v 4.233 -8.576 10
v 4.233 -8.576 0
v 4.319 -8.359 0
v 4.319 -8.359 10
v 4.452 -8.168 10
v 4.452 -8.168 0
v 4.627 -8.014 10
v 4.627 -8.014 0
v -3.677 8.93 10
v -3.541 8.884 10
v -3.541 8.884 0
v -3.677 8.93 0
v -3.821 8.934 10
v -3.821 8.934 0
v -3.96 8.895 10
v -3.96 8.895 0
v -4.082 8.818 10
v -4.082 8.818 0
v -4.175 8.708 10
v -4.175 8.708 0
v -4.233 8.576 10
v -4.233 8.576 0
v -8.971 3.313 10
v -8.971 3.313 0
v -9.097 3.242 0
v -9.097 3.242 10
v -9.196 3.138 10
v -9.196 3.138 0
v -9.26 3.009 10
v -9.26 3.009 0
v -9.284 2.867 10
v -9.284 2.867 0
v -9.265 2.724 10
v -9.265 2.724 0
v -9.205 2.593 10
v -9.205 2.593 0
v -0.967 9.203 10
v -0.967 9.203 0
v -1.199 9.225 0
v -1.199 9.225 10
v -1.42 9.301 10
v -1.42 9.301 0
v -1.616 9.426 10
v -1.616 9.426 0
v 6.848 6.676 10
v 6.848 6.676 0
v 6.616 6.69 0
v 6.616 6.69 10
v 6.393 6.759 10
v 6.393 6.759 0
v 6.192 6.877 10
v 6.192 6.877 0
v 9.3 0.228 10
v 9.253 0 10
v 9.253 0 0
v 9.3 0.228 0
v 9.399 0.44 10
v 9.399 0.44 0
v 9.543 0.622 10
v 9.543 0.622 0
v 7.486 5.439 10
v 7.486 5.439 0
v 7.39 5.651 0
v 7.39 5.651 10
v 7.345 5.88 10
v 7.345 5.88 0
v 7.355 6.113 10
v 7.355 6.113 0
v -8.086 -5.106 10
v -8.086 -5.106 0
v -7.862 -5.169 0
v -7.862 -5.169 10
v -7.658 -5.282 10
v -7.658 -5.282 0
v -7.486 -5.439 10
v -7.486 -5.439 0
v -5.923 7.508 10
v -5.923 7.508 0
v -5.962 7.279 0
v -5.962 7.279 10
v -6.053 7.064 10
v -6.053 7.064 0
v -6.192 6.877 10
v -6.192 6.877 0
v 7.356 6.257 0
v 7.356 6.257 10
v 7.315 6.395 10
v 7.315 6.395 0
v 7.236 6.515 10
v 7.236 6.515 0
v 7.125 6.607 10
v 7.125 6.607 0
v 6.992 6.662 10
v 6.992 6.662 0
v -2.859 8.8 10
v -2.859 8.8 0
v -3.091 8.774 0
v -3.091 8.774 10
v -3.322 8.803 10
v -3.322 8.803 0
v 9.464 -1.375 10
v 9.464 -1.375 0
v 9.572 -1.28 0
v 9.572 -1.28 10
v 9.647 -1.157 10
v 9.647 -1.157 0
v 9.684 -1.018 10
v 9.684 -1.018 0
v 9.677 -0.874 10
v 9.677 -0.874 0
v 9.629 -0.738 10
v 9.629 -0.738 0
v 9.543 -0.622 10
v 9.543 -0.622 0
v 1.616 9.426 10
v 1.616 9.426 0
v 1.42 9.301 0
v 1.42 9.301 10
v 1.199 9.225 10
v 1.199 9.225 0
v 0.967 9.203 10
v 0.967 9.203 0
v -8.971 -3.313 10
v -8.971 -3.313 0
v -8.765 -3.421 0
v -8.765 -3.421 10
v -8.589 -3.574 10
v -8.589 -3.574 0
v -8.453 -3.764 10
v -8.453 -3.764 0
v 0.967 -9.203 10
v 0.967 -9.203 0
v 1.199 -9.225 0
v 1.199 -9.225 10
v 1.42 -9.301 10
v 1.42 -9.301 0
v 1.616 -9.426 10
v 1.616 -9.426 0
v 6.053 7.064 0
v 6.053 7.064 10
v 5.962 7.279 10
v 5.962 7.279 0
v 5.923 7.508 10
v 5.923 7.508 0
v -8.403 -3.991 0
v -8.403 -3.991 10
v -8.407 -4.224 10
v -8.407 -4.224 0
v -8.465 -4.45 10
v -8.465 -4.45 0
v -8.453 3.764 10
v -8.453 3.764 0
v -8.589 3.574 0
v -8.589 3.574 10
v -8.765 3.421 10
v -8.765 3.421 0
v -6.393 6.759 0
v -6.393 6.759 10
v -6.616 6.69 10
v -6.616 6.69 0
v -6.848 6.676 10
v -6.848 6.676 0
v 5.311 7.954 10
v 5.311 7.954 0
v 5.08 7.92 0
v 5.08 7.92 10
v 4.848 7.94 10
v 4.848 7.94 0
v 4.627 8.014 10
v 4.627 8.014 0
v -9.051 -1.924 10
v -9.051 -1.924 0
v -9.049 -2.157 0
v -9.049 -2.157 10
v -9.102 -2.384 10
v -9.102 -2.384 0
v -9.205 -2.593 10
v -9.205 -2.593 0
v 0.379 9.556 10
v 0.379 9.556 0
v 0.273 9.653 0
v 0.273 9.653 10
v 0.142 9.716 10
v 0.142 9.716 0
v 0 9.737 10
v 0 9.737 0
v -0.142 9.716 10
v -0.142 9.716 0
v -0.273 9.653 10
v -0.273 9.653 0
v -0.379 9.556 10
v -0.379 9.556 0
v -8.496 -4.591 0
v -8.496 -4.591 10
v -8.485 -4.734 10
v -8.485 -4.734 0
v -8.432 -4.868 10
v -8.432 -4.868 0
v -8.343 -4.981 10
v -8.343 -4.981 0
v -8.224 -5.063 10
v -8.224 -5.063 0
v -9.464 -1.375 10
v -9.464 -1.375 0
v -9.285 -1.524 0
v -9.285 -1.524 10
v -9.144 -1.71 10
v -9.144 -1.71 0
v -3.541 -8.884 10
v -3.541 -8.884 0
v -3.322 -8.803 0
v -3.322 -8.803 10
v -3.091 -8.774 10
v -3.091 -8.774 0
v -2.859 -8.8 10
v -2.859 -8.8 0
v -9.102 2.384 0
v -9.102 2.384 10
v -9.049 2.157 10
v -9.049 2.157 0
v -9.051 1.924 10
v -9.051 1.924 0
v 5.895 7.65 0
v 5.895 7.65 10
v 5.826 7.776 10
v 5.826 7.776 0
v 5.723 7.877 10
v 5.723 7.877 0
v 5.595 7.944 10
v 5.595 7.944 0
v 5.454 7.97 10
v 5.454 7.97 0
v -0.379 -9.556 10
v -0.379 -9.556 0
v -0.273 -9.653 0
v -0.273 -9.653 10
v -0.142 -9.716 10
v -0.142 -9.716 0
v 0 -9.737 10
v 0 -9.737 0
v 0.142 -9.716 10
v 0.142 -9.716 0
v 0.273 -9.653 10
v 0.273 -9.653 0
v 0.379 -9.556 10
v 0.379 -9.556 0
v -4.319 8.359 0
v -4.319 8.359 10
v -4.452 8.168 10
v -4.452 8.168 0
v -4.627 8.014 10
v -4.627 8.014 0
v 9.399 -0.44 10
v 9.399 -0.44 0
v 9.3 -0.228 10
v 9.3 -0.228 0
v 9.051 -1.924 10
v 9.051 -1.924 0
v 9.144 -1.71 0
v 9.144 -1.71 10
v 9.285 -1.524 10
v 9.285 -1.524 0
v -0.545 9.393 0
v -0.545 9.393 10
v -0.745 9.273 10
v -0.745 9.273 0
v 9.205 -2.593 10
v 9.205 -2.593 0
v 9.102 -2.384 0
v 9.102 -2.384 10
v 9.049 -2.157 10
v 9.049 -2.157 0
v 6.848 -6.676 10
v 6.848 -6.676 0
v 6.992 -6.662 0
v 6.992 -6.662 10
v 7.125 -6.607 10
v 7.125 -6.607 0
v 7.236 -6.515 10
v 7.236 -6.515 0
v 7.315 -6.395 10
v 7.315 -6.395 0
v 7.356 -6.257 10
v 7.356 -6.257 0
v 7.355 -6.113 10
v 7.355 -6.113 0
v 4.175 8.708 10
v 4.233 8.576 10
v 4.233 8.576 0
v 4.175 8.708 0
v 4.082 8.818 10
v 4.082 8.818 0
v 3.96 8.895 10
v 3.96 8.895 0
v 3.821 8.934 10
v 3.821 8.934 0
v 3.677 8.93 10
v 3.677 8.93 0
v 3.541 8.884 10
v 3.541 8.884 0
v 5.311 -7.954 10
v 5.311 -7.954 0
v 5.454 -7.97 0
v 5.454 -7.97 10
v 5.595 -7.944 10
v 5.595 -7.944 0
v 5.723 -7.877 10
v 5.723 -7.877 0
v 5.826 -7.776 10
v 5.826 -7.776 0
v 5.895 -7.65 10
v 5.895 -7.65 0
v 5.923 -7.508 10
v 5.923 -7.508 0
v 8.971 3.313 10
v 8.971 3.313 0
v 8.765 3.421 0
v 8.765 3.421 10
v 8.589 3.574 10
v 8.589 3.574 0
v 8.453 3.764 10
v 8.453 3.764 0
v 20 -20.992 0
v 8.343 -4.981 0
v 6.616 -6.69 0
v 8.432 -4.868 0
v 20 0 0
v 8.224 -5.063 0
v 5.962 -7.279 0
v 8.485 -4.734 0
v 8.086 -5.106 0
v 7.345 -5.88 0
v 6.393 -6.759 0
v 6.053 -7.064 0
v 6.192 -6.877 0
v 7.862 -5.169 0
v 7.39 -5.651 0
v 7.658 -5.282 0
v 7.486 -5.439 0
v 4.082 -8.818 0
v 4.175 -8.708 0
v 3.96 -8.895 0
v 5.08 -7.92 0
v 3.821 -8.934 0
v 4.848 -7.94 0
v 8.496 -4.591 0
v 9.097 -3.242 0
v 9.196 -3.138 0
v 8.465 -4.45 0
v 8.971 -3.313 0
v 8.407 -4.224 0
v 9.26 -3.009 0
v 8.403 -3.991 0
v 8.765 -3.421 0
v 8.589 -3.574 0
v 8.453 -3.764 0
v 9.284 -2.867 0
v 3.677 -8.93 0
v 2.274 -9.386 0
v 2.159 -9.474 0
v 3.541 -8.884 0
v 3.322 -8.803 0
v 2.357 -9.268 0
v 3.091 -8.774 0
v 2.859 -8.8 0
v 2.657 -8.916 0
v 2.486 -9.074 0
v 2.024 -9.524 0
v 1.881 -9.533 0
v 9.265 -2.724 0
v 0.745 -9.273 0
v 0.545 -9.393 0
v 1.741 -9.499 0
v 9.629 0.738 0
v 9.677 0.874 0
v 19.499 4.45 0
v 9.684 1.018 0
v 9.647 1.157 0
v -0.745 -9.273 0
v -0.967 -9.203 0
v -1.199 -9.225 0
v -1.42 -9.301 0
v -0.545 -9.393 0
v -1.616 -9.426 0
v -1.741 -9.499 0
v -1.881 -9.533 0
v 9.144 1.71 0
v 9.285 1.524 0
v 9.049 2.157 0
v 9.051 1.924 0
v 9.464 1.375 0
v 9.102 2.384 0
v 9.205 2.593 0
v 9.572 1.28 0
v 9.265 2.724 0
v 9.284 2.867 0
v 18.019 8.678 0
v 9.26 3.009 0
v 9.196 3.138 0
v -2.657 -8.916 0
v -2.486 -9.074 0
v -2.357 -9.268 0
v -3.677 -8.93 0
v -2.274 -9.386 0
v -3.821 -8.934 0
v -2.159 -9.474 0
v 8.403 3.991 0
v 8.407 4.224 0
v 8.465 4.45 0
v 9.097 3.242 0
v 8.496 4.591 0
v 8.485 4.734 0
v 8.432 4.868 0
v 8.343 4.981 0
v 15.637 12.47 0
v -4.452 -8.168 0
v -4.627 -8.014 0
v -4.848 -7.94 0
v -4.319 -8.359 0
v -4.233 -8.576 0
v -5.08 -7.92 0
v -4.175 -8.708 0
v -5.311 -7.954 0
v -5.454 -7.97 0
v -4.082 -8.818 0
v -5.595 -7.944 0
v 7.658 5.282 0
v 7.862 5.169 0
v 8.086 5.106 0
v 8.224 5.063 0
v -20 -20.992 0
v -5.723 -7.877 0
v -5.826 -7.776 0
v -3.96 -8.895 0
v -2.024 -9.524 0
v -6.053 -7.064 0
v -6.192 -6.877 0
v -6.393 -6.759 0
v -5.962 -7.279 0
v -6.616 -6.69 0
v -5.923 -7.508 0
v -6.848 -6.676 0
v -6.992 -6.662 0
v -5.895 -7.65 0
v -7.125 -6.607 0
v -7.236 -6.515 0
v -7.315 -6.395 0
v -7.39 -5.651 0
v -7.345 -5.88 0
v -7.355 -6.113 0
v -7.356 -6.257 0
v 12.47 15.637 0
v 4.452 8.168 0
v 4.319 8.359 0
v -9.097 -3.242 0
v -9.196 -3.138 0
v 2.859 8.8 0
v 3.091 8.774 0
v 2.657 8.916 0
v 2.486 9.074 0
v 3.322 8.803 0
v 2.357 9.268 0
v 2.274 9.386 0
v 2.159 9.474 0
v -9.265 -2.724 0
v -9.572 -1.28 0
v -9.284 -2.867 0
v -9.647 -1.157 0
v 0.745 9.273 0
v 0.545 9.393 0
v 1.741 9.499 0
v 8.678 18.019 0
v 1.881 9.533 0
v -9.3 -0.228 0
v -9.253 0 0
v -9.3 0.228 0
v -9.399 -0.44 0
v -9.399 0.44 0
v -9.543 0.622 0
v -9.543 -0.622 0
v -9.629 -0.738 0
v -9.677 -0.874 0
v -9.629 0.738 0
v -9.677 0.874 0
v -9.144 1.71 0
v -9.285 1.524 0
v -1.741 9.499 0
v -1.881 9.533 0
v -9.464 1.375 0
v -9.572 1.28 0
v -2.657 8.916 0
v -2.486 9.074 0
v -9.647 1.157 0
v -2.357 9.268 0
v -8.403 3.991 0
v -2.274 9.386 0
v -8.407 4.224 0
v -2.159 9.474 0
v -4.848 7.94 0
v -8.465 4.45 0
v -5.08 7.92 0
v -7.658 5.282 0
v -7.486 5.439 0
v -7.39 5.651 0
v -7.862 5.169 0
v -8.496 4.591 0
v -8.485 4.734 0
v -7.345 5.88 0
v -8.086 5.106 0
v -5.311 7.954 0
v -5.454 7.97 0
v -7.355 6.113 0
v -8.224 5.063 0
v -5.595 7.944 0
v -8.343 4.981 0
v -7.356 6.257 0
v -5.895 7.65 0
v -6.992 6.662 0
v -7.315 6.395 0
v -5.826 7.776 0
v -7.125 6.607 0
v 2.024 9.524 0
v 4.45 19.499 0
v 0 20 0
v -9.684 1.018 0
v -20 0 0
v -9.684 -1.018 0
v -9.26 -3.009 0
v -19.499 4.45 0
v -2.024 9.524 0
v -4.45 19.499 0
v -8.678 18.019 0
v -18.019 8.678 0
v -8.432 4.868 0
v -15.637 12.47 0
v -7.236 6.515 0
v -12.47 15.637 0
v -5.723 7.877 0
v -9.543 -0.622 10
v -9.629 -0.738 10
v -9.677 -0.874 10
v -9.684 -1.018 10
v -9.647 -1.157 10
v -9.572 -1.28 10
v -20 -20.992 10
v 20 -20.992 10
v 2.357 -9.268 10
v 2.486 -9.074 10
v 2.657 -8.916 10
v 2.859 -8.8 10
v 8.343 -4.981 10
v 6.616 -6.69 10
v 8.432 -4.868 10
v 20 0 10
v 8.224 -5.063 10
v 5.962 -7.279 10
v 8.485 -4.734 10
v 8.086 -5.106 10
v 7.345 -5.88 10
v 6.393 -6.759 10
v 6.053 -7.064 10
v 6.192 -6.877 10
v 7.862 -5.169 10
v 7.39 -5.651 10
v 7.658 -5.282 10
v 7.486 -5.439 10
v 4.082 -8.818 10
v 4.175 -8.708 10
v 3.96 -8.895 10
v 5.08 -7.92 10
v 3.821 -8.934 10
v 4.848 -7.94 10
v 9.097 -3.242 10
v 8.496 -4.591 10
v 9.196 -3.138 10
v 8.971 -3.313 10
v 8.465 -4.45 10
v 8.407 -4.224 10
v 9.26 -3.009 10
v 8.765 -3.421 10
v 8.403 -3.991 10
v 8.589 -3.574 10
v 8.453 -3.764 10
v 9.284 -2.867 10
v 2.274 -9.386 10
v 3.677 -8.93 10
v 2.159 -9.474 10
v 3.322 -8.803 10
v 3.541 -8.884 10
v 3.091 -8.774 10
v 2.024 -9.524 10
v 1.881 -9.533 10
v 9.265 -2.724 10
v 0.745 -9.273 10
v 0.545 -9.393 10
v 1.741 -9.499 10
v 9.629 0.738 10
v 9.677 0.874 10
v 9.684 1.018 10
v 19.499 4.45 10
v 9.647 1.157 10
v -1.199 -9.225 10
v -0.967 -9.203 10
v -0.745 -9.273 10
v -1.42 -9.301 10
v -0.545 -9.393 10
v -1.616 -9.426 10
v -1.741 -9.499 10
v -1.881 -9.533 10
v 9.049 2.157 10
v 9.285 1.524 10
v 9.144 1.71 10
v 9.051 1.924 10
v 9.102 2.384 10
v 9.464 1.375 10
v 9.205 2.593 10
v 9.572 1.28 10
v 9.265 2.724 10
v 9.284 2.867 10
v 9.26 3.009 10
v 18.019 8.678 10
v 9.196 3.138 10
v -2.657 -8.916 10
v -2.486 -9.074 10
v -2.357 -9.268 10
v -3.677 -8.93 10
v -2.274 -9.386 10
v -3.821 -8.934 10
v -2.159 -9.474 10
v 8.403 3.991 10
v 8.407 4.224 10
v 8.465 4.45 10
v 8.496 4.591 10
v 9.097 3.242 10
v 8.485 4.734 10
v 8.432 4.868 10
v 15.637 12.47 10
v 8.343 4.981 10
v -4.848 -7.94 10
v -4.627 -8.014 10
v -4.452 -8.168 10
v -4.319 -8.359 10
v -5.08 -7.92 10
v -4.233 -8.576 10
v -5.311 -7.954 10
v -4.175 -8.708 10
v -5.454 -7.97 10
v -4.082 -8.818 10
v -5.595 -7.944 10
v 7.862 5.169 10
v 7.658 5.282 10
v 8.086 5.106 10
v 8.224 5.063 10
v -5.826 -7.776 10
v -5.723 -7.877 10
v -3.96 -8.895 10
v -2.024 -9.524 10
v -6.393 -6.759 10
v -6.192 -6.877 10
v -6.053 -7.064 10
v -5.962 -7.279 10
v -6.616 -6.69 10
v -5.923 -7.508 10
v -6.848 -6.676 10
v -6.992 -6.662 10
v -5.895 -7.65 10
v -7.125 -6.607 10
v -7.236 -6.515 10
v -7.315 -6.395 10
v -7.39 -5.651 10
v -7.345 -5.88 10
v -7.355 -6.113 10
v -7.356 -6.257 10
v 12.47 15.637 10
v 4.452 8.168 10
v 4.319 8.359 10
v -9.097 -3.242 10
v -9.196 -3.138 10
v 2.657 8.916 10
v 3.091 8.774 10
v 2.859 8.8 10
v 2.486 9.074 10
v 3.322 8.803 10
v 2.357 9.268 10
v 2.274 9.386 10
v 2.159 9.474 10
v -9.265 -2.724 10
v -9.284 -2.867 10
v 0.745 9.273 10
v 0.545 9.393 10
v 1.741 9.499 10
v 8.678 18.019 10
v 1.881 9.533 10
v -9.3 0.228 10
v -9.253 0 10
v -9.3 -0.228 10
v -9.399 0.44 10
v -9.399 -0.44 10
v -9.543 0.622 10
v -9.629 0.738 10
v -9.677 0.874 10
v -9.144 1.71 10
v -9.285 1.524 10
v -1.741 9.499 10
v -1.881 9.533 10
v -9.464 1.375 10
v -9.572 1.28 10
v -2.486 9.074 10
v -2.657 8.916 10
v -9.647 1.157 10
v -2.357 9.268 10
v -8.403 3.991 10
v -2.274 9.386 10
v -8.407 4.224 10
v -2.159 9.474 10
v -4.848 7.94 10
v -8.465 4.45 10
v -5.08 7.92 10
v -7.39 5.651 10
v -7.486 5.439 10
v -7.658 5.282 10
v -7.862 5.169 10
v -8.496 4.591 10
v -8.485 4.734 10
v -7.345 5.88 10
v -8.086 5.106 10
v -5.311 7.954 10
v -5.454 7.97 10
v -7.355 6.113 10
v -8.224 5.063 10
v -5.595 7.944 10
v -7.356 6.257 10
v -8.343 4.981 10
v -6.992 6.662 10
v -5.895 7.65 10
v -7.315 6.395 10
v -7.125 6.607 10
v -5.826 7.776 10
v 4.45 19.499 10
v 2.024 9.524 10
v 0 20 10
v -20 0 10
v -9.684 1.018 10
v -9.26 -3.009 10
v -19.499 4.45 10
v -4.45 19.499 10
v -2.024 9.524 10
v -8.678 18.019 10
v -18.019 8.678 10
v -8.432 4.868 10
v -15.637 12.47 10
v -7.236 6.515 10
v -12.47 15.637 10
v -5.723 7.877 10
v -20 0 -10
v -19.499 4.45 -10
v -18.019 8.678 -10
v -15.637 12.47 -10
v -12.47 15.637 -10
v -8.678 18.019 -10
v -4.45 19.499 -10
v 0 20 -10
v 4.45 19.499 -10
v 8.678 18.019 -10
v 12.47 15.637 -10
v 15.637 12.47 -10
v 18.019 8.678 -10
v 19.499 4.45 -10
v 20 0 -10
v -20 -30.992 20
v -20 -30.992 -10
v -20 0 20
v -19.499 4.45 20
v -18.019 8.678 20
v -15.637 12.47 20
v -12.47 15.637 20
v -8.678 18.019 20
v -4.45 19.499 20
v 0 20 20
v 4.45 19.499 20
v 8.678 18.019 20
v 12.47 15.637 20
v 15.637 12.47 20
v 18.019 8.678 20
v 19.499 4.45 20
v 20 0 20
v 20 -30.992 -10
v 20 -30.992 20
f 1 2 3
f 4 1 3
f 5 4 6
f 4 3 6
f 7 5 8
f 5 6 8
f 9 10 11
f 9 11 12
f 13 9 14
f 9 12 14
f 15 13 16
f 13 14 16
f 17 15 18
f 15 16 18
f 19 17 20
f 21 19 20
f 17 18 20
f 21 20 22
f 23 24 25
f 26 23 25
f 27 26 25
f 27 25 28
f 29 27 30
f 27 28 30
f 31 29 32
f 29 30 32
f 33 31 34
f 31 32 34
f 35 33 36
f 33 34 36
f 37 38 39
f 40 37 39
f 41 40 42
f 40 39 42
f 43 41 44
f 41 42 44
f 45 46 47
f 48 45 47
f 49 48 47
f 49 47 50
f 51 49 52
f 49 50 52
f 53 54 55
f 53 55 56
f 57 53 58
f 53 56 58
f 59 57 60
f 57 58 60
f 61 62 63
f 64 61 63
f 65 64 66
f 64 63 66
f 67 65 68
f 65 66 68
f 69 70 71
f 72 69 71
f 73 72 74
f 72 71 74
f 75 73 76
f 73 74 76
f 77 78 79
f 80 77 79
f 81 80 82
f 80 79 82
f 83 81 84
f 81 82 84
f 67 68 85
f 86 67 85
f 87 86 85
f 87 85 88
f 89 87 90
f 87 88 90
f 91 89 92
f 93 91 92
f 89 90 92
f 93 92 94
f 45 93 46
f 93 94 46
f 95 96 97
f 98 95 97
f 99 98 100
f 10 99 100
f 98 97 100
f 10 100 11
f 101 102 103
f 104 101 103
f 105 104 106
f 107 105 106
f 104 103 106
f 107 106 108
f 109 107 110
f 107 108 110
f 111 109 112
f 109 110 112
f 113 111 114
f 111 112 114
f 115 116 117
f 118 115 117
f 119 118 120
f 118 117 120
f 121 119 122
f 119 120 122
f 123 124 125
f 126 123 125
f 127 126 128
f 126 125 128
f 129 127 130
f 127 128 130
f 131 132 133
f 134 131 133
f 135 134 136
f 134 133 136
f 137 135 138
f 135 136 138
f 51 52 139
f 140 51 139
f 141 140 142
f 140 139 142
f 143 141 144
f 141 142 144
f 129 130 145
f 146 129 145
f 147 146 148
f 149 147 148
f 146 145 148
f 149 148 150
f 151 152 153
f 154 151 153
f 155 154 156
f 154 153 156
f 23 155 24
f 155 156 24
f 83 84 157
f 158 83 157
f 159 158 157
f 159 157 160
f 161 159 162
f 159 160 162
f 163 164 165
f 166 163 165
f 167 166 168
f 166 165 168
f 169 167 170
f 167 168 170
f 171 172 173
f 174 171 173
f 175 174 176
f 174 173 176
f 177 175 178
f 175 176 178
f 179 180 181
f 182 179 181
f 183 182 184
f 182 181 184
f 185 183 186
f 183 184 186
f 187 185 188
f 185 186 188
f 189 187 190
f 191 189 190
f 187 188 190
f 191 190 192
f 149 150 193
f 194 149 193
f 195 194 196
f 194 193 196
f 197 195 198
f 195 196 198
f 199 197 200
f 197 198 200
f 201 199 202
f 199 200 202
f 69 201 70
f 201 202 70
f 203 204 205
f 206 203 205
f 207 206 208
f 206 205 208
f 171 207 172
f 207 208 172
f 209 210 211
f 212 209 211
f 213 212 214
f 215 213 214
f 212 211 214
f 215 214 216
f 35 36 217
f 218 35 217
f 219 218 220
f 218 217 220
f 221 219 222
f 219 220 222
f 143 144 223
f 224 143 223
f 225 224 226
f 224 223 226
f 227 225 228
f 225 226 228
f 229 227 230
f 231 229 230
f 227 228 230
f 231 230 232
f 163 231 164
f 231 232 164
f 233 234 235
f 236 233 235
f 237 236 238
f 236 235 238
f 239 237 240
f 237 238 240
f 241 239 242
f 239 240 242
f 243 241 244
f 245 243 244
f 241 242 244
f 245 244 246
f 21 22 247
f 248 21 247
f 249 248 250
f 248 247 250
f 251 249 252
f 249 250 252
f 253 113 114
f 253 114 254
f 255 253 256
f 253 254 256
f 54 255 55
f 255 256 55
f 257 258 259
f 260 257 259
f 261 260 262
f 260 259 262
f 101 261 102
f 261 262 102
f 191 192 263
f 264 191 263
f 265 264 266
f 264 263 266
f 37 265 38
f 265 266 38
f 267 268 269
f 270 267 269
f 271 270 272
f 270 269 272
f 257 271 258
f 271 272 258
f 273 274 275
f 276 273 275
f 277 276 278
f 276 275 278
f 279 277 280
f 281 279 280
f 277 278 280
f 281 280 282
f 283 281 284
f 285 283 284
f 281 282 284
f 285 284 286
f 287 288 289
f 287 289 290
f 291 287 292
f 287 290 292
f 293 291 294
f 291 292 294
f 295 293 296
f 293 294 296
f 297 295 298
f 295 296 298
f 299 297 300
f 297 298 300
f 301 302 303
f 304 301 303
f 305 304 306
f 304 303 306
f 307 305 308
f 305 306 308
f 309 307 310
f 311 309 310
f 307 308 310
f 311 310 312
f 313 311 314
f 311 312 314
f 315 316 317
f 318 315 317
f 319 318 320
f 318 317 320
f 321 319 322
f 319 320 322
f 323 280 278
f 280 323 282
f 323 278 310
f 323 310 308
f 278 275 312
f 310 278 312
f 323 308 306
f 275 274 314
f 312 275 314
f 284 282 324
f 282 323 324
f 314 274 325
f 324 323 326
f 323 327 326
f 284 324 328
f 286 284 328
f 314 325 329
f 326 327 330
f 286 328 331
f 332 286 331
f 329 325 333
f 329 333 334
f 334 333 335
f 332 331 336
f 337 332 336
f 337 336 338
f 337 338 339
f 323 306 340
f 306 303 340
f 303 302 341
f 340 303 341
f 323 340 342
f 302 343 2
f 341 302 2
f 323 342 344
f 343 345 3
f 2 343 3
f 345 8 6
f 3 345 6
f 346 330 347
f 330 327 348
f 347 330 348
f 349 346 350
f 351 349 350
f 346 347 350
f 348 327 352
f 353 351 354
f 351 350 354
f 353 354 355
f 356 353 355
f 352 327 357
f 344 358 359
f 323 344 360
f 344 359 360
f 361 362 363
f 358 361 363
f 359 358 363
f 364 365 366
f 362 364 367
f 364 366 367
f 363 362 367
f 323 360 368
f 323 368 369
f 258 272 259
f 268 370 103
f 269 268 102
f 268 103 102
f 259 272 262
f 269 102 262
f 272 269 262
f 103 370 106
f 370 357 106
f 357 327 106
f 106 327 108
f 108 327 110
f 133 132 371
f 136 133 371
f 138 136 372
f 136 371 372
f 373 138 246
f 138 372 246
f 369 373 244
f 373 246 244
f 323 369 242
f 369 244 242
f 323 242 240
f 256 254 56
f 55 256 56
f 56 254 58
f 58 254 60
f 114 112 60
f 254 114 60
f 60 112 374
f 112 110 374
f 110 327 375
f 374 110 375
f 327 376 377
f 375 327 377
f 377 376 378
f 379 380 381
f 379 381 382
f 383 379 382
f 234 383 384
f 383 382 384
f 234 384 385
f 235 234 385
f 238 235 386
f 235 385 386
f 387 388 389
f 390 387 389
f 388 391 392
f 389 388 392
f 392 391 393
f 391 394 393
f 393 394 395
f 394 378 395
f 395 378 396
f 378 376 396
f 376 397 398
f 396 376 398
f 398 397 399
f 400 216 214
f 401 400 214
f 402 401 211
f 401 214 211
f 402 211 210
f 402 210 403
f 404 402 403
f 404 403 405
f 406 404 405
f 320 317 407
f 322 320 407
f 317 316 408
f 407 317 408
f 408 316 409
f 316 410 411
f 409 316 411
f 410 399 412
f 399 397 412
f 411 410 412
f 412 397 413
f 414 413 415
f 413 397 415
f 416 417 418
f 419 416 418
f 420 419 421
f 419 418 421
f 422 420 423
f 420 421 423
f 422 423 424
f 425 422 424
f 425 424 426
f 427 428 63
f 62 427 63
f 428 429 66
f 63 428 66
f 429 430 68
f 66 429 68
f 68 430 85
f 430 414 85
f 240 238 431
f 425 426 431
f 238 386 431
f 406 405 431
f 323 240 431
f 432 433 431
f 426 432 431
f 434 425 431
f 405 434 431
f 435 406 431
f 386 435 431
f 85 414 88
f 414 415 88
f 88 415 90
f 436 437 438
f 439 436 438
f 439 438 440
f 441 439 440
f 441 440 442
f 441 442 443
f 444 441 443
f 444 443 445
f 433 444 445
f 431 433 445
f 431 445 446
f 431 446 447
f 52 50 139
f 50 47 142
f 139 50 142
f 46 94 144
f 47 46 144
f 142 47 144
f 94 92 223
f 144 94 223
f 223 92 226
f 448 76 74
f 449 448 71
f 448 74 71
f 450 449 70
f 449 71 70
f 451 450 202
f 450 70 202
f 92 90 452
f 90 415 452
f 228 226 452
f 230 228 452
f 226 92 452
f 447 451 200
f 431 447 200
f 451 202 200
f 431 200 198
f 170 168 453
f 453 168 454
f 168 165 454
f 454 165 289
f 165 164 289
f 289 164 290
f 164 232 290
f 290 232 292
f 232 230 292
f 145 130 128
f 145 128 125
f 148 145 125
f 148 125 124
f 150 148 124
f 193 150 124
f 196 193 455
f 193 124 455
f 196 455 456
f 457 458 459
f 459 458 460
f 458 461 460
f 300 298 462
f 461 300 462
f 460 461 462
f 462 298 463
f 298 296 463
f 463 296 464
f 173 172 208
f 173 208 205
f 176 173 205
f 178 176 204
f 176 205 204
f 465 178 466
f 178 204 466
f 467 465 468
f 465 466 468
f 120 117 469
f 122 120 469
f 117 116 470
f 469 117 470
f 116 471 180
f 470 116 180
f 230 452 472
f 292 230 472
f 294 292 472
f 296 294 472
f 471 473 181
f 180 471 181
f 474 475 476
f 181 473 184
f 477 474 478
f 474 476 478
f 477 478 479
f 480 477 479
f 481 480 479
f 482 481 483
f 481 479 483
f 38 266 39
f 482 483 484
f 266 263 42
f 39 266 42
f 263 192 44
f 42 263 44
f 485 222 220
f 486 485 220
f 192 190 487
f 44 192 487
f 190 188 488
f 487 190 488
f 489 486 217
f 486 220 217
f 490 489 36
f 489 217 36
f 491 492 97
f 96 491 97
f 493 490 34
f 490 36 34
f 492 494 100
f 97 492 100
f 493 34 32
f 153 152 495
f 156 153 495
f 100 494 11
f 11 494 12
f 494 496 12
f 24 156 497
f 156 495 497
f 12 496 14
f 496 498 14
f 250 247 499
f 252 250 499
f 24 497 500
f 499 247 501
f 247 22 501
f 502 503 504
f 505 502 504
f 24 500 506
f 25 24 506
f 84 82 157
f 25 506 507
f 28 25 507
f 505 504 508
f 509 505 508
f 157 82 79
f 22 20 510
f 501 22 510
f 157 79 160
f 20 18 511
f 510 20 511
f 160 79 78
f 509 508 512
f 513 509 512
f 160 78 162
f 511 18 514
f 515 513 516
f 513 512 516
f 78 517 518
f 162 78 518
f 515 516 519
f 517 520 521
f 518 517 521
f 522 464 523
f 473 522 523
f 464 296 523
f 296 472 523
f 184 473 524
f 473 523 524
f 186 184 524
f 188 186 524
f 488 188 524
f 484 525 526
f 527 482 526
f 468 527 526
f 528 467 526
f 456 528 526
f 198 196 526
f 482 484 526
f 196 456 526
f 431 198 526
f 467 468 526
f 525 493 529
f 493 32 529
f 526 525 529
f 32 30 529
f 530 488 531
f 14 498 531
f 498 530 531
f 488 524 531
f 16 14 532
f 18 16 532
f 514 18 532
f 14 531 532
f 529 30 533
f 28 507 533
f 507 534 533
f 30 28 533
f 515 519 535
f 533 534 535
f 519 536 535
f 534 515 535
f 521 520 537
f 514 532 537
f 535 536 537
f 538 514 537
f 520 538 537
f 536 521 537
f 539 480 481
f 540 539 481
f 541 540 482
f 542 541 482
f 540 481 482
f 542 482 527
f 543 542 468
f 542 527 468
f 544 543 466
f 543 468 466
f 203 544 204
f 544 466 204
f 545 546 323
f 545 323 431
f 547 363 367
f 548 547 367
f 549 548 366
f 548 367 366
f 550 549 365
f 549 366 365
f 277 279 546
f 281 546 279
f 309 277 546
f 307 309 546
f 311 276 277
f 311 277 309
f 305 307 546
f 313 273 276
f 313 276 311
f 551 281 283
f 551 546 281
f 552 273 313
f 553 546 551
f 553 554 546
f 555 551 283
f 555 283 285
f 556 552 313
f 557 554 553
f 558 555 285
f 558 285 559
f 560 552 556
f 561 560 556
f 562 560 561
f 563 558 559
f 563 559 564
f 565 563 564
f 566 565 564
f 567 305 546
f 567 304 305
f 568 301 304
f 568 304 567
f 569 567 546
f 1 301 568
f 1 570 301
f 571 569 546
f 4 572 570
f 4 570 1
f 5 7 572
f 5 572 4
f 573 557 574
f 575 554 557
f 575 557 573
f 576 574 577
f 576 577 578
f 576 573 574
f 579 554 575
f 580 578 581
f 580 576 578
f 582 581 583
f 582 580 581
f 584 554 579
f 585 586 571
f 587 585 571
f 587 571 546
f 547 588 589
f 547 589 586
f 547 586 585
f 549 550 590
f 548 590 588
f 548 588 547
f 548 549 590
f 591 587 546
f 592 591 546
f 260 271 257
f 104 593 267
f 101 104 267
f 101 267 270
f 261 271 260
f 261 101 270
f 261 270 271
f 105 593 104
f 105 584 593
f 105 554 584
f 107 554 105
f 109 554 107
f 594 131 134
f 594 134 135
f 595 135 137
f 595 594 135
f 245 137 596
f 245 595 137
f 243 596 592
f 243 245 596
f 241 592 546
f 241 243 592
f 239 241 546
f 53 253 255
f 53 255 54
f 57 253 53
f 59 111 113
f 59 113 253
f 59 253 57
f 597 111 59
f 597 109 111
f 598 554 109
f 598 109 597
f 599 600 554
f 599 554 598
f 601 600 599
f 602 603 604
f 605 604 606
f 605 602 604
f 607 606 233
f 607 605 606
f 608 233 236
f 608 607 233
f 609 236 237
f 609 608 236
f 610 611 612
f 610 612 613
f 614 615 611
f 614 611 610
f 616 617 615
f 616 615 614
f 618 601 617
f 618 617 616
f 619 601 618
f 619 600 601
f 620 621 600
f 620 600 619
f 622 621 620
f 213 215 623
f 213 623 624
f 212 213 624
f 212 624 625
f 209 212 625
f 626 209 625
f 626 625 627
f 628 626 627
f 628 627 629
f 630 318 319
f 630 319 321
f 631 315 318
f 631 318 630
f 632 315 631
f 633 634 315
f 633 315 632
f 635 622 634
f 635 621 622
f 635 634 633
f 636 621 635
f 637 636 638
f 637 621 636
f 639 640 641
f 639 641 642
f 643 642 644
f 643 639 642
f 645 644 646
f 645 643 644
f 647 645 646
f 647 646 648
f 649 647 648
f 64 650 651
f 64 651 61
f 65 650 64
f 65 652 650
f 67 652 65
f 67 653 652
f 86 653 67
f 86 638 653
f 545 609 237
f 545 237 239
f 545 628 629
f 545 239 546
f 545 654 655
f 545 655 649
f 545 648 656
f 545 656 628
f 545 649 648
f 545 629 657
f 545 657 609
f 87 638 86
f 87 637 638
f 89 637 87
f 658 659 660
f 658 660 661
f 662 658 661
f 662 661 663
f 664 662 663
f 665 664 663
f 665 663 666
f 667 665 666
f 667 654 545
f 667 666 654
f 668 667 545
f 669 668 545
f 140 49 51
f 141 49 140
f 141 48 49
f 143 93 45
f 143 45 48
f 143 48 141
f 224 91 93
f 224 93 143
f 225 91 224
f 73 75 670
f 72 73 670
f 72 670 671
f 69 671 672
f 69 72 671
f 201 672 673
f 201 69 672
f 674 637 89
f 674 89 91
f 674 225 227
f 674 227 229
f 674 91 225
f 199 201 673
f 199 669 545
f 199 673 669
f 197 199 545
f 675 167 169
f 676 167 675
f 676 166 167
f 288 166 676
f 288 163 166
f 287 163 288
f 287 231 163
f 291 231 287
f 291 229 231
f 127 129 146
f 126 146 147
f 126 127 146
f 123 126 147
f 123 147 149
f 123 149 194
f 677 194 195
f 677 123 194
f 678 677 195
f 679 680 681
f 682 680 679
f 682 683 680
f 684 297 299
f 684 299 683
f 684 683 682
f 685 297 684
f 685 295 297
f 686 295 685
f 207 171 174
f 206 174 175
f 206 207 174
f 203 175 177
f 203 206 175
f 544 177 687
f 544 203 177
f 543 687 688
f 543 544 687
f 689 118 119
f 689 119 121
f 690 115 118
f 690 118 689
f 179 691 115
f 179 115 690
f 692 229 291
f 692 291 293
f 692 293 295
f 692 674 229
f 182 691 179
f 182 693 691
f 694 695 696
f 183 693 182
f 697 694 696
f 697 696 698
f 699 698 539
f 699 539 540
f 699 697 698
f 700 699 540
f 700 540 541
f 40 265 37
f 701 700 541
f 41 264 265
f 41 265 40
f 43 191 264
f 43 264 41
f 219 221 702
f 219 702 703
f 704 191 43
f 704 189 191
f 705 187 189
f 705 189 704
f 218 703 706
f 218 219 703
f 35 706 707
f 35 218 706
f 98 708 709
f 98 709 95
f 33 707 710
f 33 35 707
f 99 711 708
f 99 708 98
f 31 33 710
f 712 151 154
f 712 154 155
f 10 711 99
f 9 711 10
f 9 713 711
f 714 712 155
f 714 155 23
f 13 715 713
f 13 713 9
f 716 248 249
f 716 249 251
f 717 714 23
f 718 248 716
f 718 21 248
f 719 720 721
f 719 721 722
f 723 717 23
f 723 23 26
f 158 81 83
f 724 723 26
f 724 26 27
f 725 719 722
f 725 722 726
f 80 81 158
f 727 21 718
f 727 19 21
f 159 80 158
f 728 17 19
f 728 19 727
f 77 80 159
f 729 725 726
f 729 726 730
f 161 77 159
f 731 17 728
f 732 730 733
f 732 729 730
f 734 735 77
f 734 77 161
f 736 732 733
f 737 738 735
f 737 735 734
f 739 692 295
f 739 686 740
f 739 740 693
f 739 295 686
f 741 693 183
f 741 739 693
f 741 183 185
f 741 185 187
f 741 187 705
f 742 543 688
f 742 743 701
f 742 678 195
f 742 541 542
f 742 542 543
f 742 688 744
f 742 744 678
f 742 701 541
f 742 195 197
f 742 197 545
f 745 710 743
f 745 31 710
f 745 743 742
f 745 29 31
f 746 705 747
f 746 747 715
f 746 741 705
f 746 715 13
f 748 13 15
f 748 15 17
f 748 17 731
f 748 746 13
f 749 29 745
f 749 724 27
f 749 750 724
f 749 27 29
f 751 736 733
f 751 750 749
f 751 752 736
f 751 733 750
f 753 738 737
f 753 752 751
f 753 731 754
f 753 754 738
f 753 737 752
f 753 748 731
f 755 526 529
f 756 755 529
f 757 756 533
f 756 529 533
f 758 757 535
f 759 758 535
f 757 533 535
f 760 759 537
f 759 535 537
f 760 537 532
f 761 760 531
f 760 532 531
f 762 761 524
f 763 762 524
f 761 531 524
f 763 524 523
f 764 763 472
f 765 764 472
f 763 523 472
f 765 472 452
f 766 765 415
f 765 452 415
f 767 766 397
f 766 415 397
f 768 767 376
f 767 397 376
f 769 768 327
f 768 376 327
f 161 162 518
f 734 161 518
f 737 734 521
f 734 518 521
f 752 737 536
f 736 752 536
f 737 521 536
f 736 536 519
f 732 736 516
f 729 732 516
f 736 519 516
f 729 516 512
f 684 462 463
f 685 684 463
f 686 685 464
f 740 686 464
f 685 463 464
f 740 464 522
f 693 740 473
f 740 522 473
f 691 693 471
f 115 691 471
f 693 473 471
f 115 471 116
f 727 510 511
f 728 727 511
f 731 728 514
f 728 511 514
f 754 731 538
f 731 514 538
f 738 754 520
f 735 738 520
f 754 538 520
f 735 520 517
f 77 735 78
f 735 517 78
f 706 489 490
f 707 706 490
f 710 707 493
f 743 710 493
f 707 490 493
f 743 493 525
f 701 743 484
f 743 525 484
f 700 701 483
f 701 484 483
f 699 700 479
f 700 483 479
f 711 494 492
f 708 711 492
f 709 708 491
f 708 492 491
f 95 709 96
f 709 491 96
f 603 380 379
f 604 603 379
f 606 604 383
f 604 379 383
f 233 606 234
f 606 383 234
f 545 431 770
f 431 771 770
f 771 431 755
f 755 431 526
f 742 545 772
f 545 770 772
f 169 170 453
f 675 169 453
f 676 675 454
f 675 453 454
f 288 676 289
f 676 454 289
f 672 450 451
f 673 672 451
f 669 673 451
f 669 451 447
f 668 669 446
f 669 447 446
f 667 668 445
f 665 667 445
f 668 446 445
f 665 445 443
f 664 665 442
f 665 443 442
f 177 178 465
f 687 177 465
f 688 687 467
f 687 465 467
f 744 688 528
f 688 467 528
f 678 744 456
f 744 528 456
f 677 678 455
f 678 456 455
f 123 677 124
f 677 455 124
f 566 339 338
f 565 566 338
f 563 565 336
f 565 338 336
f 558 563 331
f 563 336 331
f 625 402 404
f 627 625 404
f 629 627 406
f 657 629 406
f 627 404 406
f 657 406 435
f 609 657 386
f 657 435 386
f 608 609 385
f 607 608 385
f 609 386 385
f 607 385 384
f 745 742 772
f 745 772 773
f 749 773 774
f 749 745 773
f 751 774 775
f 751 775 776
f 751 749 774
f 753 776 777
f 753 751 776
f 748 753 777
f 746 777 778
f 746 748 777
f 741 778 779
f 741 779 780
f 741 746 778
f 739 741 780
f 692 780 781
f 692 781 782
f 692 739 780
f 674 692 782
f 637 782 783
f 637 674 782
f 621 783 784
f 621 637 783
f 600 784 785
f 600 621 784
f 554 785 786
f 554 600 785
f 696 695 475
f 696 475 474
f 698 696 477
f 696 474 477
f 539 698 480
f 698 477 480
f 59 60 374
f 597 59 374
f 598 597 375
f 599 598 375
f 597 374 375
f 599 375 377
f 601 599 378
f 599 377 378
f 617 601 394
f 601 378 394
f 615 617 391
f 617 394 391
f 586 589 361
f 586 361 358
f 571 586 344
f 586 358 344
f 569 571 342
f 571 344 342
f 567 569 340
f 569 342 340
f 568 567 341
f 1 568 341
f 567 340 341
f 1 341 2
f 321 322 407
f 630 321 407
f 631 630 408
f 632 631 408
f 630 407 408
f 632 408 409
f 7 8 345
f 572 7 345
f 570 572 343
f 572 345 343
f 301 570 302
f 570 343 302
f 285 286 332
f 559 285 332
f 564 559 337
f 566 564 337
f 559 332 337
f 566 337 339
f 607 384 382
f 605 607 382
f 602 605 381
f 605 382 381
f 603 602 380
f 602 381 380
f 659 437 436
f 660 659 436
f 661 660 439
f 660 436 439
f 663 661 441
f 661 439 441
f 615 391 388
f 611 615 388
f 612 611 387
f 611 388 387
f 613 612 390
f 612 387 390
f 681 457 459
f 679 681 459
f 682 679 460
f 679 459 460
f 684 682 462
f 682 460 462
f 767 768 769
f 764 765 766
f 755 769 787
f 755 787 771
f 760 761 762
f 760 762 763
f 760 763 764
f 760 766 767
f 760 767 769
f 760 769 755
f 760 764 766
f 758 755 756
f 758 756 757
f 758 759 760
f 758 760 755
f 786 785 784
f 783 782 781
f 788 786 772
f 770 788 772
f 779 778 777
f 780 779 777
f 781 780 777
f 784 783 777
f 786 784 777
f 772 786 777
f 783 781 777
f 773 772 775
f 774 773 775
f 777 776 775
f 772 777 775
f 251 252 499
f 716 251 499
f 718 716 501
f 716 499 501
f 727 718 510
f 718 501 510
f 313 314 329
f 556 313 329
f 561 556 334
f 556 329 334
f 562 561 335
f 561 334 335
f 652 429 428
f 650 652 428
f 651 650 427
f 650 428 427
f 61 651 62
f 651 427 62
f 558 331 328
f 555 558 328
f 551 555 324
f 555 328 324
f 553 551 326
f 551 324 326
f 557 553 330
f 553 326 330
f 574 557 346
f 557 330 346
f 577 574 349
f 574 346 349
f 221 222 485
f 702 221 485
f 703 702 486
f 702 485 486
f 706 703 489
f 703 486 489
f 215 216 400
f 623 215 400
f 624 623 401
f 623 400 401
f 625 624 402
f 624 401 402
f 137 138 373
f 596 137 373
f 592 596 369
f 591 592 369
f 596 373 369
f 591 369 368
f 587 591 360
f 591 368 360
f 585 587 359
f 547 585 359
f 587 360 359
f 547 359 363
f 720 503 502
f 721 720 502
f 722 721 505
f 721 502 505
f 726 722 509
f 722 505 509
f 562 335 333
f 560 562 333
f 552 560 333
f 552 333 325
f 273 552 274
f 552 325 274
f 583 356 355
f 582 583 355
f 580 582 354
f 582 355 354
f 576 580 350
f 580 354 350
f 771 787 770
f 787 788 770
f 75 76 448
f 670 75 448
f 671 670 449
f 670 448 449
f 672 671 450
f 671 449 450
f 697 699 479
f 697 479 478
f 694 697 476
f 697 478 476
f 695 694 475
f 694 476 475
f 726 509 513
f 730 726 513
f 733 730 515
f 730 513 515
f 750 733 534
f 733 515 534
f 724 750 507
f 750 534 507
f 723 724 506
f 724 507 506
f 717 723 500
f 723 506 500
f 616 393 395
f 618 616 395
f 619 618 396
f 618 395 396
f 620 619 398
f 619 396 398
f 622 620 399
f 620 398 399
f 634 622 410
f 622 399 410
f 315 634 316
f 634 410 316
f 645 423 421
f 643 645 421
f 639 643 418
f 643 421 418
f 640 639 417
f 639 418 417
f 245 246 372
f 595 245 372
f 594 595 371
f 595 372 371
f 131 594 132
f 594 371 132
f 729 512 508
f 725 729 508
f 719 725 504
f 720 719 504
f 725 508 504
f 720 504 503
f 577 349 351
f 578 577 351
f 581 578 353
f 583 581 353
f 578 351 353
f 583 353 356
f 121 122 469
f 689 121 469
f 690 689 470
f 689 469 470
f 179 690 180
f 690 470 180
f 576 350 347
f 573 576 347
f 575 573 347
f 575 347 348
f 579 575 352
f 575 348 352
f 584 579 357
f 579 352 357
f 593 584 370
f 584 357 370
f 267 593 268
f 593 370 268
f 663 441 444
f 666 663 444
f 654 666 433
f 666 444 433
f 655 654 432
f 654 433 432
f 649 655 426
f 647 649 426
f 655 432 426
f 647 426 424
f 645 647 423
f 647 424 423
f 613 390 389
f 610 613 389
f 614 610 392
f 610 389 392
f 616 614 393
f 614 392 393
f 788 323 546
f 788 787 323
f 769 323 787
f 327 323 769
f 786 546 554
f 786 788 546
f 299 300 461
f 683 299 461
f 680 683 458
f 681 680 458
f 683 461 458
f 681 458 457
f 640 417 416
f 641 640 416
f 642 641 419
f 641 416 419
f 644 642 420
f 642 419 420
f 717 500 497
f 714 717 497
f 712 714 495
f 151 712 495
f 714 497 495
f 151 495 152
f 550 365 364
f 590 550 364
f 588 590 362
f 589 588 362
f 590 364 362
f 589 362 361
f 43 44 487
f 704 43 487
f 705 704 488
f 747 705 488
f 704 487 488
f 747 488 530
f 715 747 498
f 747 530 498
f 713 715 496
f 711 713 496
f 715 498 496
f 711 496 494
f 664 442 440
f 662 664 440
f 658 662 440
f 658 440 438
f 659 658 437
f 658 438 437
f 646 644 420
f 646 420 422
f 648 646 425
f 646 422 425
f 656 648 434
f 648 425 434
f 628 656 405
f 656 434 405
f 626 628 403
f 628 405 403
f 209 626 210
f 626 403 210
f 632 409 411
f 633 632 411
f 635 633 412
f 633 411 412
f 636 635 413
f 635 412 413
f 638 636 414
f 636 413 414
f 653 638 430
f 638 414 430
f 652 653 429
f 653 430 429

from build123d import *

# Parameters (mm, degrees)
BOSS_EXTRUDE1_DEPTH = 10
BOSS_EXTRUDE2_DEPTH = 10
SKETCH3_W           = 40
SKETCH3_H           = 10
BOSS_EXTRUDE3_DEPTH = 10


with BuildPart() as part:
    # Sketch1 → Boss-Extrude1 (new body)
    with BuildSketch(Plane.XY):
        with BuildLine():
            ThreePointArc((0.378650208, 9.55600532), (0, 9.736842105), (-0.378650208, 9.55600532))
            ThreePointArc((-0.378650208, 9.55600532), (-0.641665483, 9.327218092), (-0.967233833, 9.202615203))
            ThreePointArc((-0.967233833, 9.202615203), (-1.311594131, 9.256805753), (-1.616429431, 9.425909481))
            ThreePointArc((-1.616429431, 9.425909481), (-2.024403305, 9.524068744), (-2.357181016, 9.268457871))
            ThreePointArc((-2.357181016, 9.268457871), (-2.566881237, 8.989986242), (-2.85942874, 8.800416759))
            ThreePointArc((-2.85942874, 8.800416759), (-3.207530788, 8.781826585), (-3.540863348, 8.883856167))
            ThreePointArc((-3.540863348, 8.883856167), (-3.960330472, 8.895047877), (-4.232691702, 8.575834338))
            ThreePointArc((-4.232691702, 8.575834338), (-4.379911963, 8.259848855), (-4.62665289, 8.013597874))
            ThreePointArc((-4.62665289, 8.013597874), (-4.963282959, 7.923039454), (-5.310544545, 7.95353571))
            ThreePointArc((-5.310544545, 7.95353571), (-5.723172193, 7.877270735), (-5.923213451, 7.508405694))
            ThreePointArc((-5.923213451, 7.508405694), (-6.00151952, 7.168716439), (-6.191670107, 6.876546309))
            ThreePointArc((-6.191670107, 6.876546309), (-6.502115847, 6.717977481), (-6.848129462, 6.675607576))
            ThreePointArc((-6.848129462, 6.675607576), (-7.235883827, 6.515219062), (-7.354862349, 6.112823691))
            ThreePointArc((-7.354862349, 6.112823691), (-7.360831875, 5.764276714), (-7.48608163, 5.438956672))
            ThreePointArc((-7.48608163, 5.438956672), (-7.756775072, 5.219307655), (-8.086418262, 5.105923359))
            ThreePointArc((-8.086418262, 5.105923359), (-8.432352616, 4.868421053), (-8.465068469, 4.450081961))
            ThreePointArc((-8.465068469, 4.450081961), (-8.398440555, 4.107910437), (-8.453315463, 3.76365853))
            ThreePointArc((-8.453315463, 3.76365853), (-8.672426006, 3.492529039), (-8.97129178, 3.31308579))
            ThreePointArc((-8.97129178, 3.31308579), (-9.260287132, 3.008849682), (-9.205310478, 2.592850295))
            ThreePointArc((-9.205310478, 2.592850295), (-9.068997084, 2.272008762), (-9.051098847, 1.92387045))
            ThreePointArc((-9.051098847, 1.92387045), (-9.209050308, 1.613110146), (-9.464076798, 1.375450473))
            ThreePointArc((-9.464076798, 1.375450473), (-9.683502665, 1.017777142), (-9.543236247, 0.622298629))
            ThreePointArc((-9.543236247, 0.622298629), (-9.343194922, 0.336809401), (-9.25330578, 0))
            ThreePointArc((-9.25330578, 0), (-9.343194922, -0.336809401), (-9.543236247, -0.622298629))
            ThreePointArc((-9.543236247, -0.622298629), (-9.683502665, -1.017777142), (-9.464076798, -1.375450473))
            ThreePointArc((-9.464076798, -1.375450473), (-9.209050308, -1.613110146), (-9.051098847, -1.92387045))
            ThreePointArc((-9.051098847, -1.92387045), (-9.068997084, -2.272008762), (-9.205310478, -2.592850295))
            ThreePointArc((-9.205310478, -2.592850295), (-9.260287132, -3.008849682), (-8.97129178, -3.31308579))
            ThreePointArc((-8.97129178, -3.31308579), (-8.672426006, -3.492529039), (-8.453315463, -3.76365853))
            ThreePointArc((-8.453315463, -3.76365853), (-8.398440555, -4.107910437), (-8.465068469, -4.450081961))
            ThreePointArc((-8.465068469, -4.450081961), (-8.432352616, -4.868421053), (-8.086418262, -5.105923359))
            ThreePointArc((-8.086418262, -5.105923359), (-7.756775072, -5.219307655), (-7.48608163, -5.438956672))
            ThreePointArc((-7.48608163, -5.438956672), (-7.360831875, -5.764276714), (-7.354862349, -6.112823691))
            ThreePointArc((-7.354862349, -6.112823691), (-7.235883827, -6.515219062), (-6.848129462, -6.675607576))
            ThreePointArc((-6.848129462, -6.675607576), (-6.502115847, -6.717977481), (-6.191670107, -6.876546309))
            ThreePointArc((-6.191670107, -6.876546309), (-6.00151952, -7.168716439), (-5.923213451, -7.508405694))
            ThreePointArc((-5.923213451, -7.508405694), (-5.723172193, -7.877270735), (-5.310544545, -7.95353571))
            ThreePointArc((-5.310544545, -7.95353571), (-4.963282959, -7.923039454), (-4.62665289, -8.013597874))
            ThreePointArc((-4.62665289, -8.013597874), (-4.379911963, -8.259848855), (-4.232691702, -8.575834338))
            ThreePointArc((-4.232691702, -8.575834338), (-3.960330472, -8.895047877), (-3.540863348, -8.883856167))
            ThreePointArc((-3.540863348, -8.883856167), (-3.207530788, -8.781826585), (-2.85942874, -8.800416759))
            ThreePointArc((-2.85942874, -8.800416759), (-2.566881237, -8.989986242), (-2.357181016, -9.268457871))
            ThreePointArc((-2.357181016, -9.268457871), (-2.024403305, -9.524068744), (-1.616429431, -9.425909481))
            ThreePointArc((-1.616429431, -9.425909481), (-1.311594131, -9.256805753), (-0.967233833, -9.202615203))
            ThreePointArc((-0.967233833, -9.202615203), (-0.641665483, -9.327218092), (-0.378650208, -9.55600532))
            ThreePointArc((-0.378650208, -9.55600532), (0, -9.736842105), (0.378650208, -9.55600532))
            ThreePointArc((0.378650208, -9.55600532), (0.641665483, -9.327218092), (0.967233833, -9.202615203))
            ThreePointArc((0.967233833, -9.202615203), (1.311594131, -9.256805753), (1.616429431, -9.425909481))
            ThreePointArc((1.616429431, -9.425909481), (2.024403305, -9.524068744), (2.357181016, -9.268457871))
            ThreePointArc((2.357181016, -9.268457871), (2.566881237, -8.989986242), (2.85942874, -8.800416759))
            ThreePointArc((2.85942874, -8.800416759), (3.207530788, -8.781826585), (3.540863348, -8.883856167))
            ThreePointArc((3.540863348, -8.883856167), (3.960330472, -8.895047877), (4.232691702, -8.575834338))
            ThreePointArc((4.232691702, -8.575834338), (4.379911963, -8.259848855), (4.62665289, -8.013597874))
            ThreePointArc((4.62665289, -8.013597874), (4.963282959, -7.923039454), (5.310544545, -7.95353571))
            ThreePointArc((5.310544545, -7.95353571), (5.723172193, -7.877270735), (5.923213451, -7.508405694))
            ThreePointArc((5.923213451, -7.508405694), (6.00151952, -7.168716439), (6.191670107, -6.876546309))
            ThreePointArc((6.191670107, -6.876546309), (6.502115847, -6.717977481), (6.848129462, -6.675607576))
            ThreePointArc((6.848129462, -6.675607576), (7.235883827, -6.515219062), (7.354862349, -6.112823691))
            ThreePointArc((7.354862349, -6.112823691), (7.360831875, -5.764276714), (7.48608163, -5.438956672))
            ThreePointArc((7.48608163, -5.438956672), (7.756775072, -5.219307655), (8.086418262, -5.105923359))
            ThreePointArc((8.086418262, -5.105923359), (8.432352616, -4.868421053), (8.465068469, -4.450081961))
            ThreePointArc((8.465068469, -4.450081961), (8.398440555, -4.107910437), (8.453315463, -3.76365853))
            ThreePointArc((8.453315463, -3.76365853), (8.672426006, -3.492529039), (8.97129178, -3.31308579))
            ThreePointArc((8.97129178, -3.31308579), (9.260287132, -3.008849682), (9.205310478, -2.592850295))
            ThreePointArc((9.205310478, -2.592850295), (9.068997084, -2.272008762), (9.051098847, -1.92387045))
            ThreePointArc((9.051098847, -1.92387045), (9.209050308, -1.613110146), (9.464076798, -1.375450473))
            ThreePointArc((9.464076798, -1.375450473), (9.683502665, -1.017777142), (9.543236247, -0.622298629))
            ThreePointArc((9.543236247, -0.622298629), (9.343194922, -0.336809401), (9.25330578, 0))
            ThreePointArc((9.25330578, 0), (9.343194922, 0.336809401), (9.543236247, 0.622298629))
            ThreePointArc((9.543236247, 0.622298629), (9.683502665, 1.017777142), (9.464076798, 1.375450473))
            ThreePointArc((9.464076798, 1.375450473), (9.209050308, 1.613110146), (9.051098847, 1.92387045))
            ThreePointArc((9.051098847, 1.92387045), (9.068997084, 2.272008762), (9.205310478, 2.592850295))
            ThreePointArc((9.205310478, 2.592850295), (9.260287132, 3.008849682), (8.97129178, 3.31308579))
            ThreePointArc((8.97129178, 3.31308579), (8.672426006, 3.492529039), (8.453315463, 3.76365853))
            ThreePointArc((8.453315463, 3.76365853), (8.398440555, 4.107910437), (8.465068469, 4.450081961))
            ThreePointArc((8.465068469, 4.450081961), (8.432352616, 4.868421053), (8.086418262, 5.105923359))
            ThreePointArc((8.086418262, 5.105923359), (7.756775072, 5.219307655), (7.48608163, 5.438956672))
            ThreePointArc((7.48608163, 5.438956672), (7.360831875, 5.764276714), (7.354862349, 6.112823691))
            ThreePointArc((7.354862349, 6.112823691), (7.235883827, 6.515219062), (6.848129462, 6.675607576))
            ThreePointArc((6.848129462, 6.675607576), (6.502115847, 6.717977481), (6.191670107, 6.876546309))
            ThreePointArc((6.191670107, 6.876546309), (6.00151952, 7.168716439), (5.923213451, 7.508405694))
            ThreePointArc((5.923213451, 7.508405694), (5.723172193, 7.877270735), (5.310544545, 7.95353571))
            ThreePointArc((5.310544545, 7.95353571), (4.963282959, 7.923039454), (4.62665289, 8.013597874))
            ThreePointArc((4.62665289, 8.013597874), (4.379911963, 8.259848855), (4.232691702, 8.575834338))
            ThreePointArc((4.232691702, 8.575834338), (3.960330472, 8.895047877), (3.540863348, 8.883856167))
            ThreePointArc((3.540863348, 8.883856167), (3.207530788, 8.781826585), (2.85942874, 8.800416759))
            ThreePointArc((2.85942874, 8.800416759), (2.566881237, 8.989986242), (2.357181016, 9.268457871))
            ThreePointArc((2.357181016, 9.268457871), (2.024403305, 9.524068744), (1.616429431, 9.425909481))
            ThreePointArc((1.616429431, 9.425909481), (1.311594131, 9.256805753), (0.967233833, 9.202615203))
            ThreePointArc((0.967233833, 9.202615203), (0.641665483, 9.327218092), (0.378650208, 9.55600532))
        make_face()
    extrude(amount=BOSS_EXTRUDE1_DEPTH)

    # Sketch2 → Boss-Extrude2 (add)
    with BuildSketch(Plane(origin=(0, 0, 0), x_dir=(-1, 0, 0), z_dir=(0, 0, -1))):
        with BuildLine():
            Line((-20, 0), (-20, -30.991945279))
            Line((-20, -30.991945279), (20, -30.991945279))
            Line((20, -30.991945279), (20, 0))
            ThreePointArc((20, 0), (0, 20), (-20, 0))
        make_face()
    boss_extrude2 = extrude(amount=BOSS_EXTRUDE2_DEPTH)

    # Mirror2: Boss-Extrude2 across plane
    add(boss_extrude2.mirror(Plane.XY.offset(5)))

    # Sketch3 → Boss-Extrude3 (add)
    with BuildSketch(Plane(origin=(0, 0, 10), x_dir=(-1, 0, 0), z_dir=(0, 0, -1))):
        with Locations((0, -25.991945279)):
            Rectangle(SKETCH3_W, SKETCH3_H)
    extrude(amount=BOSS_EXTRUDE3_DEPTH)


solid = part.part
